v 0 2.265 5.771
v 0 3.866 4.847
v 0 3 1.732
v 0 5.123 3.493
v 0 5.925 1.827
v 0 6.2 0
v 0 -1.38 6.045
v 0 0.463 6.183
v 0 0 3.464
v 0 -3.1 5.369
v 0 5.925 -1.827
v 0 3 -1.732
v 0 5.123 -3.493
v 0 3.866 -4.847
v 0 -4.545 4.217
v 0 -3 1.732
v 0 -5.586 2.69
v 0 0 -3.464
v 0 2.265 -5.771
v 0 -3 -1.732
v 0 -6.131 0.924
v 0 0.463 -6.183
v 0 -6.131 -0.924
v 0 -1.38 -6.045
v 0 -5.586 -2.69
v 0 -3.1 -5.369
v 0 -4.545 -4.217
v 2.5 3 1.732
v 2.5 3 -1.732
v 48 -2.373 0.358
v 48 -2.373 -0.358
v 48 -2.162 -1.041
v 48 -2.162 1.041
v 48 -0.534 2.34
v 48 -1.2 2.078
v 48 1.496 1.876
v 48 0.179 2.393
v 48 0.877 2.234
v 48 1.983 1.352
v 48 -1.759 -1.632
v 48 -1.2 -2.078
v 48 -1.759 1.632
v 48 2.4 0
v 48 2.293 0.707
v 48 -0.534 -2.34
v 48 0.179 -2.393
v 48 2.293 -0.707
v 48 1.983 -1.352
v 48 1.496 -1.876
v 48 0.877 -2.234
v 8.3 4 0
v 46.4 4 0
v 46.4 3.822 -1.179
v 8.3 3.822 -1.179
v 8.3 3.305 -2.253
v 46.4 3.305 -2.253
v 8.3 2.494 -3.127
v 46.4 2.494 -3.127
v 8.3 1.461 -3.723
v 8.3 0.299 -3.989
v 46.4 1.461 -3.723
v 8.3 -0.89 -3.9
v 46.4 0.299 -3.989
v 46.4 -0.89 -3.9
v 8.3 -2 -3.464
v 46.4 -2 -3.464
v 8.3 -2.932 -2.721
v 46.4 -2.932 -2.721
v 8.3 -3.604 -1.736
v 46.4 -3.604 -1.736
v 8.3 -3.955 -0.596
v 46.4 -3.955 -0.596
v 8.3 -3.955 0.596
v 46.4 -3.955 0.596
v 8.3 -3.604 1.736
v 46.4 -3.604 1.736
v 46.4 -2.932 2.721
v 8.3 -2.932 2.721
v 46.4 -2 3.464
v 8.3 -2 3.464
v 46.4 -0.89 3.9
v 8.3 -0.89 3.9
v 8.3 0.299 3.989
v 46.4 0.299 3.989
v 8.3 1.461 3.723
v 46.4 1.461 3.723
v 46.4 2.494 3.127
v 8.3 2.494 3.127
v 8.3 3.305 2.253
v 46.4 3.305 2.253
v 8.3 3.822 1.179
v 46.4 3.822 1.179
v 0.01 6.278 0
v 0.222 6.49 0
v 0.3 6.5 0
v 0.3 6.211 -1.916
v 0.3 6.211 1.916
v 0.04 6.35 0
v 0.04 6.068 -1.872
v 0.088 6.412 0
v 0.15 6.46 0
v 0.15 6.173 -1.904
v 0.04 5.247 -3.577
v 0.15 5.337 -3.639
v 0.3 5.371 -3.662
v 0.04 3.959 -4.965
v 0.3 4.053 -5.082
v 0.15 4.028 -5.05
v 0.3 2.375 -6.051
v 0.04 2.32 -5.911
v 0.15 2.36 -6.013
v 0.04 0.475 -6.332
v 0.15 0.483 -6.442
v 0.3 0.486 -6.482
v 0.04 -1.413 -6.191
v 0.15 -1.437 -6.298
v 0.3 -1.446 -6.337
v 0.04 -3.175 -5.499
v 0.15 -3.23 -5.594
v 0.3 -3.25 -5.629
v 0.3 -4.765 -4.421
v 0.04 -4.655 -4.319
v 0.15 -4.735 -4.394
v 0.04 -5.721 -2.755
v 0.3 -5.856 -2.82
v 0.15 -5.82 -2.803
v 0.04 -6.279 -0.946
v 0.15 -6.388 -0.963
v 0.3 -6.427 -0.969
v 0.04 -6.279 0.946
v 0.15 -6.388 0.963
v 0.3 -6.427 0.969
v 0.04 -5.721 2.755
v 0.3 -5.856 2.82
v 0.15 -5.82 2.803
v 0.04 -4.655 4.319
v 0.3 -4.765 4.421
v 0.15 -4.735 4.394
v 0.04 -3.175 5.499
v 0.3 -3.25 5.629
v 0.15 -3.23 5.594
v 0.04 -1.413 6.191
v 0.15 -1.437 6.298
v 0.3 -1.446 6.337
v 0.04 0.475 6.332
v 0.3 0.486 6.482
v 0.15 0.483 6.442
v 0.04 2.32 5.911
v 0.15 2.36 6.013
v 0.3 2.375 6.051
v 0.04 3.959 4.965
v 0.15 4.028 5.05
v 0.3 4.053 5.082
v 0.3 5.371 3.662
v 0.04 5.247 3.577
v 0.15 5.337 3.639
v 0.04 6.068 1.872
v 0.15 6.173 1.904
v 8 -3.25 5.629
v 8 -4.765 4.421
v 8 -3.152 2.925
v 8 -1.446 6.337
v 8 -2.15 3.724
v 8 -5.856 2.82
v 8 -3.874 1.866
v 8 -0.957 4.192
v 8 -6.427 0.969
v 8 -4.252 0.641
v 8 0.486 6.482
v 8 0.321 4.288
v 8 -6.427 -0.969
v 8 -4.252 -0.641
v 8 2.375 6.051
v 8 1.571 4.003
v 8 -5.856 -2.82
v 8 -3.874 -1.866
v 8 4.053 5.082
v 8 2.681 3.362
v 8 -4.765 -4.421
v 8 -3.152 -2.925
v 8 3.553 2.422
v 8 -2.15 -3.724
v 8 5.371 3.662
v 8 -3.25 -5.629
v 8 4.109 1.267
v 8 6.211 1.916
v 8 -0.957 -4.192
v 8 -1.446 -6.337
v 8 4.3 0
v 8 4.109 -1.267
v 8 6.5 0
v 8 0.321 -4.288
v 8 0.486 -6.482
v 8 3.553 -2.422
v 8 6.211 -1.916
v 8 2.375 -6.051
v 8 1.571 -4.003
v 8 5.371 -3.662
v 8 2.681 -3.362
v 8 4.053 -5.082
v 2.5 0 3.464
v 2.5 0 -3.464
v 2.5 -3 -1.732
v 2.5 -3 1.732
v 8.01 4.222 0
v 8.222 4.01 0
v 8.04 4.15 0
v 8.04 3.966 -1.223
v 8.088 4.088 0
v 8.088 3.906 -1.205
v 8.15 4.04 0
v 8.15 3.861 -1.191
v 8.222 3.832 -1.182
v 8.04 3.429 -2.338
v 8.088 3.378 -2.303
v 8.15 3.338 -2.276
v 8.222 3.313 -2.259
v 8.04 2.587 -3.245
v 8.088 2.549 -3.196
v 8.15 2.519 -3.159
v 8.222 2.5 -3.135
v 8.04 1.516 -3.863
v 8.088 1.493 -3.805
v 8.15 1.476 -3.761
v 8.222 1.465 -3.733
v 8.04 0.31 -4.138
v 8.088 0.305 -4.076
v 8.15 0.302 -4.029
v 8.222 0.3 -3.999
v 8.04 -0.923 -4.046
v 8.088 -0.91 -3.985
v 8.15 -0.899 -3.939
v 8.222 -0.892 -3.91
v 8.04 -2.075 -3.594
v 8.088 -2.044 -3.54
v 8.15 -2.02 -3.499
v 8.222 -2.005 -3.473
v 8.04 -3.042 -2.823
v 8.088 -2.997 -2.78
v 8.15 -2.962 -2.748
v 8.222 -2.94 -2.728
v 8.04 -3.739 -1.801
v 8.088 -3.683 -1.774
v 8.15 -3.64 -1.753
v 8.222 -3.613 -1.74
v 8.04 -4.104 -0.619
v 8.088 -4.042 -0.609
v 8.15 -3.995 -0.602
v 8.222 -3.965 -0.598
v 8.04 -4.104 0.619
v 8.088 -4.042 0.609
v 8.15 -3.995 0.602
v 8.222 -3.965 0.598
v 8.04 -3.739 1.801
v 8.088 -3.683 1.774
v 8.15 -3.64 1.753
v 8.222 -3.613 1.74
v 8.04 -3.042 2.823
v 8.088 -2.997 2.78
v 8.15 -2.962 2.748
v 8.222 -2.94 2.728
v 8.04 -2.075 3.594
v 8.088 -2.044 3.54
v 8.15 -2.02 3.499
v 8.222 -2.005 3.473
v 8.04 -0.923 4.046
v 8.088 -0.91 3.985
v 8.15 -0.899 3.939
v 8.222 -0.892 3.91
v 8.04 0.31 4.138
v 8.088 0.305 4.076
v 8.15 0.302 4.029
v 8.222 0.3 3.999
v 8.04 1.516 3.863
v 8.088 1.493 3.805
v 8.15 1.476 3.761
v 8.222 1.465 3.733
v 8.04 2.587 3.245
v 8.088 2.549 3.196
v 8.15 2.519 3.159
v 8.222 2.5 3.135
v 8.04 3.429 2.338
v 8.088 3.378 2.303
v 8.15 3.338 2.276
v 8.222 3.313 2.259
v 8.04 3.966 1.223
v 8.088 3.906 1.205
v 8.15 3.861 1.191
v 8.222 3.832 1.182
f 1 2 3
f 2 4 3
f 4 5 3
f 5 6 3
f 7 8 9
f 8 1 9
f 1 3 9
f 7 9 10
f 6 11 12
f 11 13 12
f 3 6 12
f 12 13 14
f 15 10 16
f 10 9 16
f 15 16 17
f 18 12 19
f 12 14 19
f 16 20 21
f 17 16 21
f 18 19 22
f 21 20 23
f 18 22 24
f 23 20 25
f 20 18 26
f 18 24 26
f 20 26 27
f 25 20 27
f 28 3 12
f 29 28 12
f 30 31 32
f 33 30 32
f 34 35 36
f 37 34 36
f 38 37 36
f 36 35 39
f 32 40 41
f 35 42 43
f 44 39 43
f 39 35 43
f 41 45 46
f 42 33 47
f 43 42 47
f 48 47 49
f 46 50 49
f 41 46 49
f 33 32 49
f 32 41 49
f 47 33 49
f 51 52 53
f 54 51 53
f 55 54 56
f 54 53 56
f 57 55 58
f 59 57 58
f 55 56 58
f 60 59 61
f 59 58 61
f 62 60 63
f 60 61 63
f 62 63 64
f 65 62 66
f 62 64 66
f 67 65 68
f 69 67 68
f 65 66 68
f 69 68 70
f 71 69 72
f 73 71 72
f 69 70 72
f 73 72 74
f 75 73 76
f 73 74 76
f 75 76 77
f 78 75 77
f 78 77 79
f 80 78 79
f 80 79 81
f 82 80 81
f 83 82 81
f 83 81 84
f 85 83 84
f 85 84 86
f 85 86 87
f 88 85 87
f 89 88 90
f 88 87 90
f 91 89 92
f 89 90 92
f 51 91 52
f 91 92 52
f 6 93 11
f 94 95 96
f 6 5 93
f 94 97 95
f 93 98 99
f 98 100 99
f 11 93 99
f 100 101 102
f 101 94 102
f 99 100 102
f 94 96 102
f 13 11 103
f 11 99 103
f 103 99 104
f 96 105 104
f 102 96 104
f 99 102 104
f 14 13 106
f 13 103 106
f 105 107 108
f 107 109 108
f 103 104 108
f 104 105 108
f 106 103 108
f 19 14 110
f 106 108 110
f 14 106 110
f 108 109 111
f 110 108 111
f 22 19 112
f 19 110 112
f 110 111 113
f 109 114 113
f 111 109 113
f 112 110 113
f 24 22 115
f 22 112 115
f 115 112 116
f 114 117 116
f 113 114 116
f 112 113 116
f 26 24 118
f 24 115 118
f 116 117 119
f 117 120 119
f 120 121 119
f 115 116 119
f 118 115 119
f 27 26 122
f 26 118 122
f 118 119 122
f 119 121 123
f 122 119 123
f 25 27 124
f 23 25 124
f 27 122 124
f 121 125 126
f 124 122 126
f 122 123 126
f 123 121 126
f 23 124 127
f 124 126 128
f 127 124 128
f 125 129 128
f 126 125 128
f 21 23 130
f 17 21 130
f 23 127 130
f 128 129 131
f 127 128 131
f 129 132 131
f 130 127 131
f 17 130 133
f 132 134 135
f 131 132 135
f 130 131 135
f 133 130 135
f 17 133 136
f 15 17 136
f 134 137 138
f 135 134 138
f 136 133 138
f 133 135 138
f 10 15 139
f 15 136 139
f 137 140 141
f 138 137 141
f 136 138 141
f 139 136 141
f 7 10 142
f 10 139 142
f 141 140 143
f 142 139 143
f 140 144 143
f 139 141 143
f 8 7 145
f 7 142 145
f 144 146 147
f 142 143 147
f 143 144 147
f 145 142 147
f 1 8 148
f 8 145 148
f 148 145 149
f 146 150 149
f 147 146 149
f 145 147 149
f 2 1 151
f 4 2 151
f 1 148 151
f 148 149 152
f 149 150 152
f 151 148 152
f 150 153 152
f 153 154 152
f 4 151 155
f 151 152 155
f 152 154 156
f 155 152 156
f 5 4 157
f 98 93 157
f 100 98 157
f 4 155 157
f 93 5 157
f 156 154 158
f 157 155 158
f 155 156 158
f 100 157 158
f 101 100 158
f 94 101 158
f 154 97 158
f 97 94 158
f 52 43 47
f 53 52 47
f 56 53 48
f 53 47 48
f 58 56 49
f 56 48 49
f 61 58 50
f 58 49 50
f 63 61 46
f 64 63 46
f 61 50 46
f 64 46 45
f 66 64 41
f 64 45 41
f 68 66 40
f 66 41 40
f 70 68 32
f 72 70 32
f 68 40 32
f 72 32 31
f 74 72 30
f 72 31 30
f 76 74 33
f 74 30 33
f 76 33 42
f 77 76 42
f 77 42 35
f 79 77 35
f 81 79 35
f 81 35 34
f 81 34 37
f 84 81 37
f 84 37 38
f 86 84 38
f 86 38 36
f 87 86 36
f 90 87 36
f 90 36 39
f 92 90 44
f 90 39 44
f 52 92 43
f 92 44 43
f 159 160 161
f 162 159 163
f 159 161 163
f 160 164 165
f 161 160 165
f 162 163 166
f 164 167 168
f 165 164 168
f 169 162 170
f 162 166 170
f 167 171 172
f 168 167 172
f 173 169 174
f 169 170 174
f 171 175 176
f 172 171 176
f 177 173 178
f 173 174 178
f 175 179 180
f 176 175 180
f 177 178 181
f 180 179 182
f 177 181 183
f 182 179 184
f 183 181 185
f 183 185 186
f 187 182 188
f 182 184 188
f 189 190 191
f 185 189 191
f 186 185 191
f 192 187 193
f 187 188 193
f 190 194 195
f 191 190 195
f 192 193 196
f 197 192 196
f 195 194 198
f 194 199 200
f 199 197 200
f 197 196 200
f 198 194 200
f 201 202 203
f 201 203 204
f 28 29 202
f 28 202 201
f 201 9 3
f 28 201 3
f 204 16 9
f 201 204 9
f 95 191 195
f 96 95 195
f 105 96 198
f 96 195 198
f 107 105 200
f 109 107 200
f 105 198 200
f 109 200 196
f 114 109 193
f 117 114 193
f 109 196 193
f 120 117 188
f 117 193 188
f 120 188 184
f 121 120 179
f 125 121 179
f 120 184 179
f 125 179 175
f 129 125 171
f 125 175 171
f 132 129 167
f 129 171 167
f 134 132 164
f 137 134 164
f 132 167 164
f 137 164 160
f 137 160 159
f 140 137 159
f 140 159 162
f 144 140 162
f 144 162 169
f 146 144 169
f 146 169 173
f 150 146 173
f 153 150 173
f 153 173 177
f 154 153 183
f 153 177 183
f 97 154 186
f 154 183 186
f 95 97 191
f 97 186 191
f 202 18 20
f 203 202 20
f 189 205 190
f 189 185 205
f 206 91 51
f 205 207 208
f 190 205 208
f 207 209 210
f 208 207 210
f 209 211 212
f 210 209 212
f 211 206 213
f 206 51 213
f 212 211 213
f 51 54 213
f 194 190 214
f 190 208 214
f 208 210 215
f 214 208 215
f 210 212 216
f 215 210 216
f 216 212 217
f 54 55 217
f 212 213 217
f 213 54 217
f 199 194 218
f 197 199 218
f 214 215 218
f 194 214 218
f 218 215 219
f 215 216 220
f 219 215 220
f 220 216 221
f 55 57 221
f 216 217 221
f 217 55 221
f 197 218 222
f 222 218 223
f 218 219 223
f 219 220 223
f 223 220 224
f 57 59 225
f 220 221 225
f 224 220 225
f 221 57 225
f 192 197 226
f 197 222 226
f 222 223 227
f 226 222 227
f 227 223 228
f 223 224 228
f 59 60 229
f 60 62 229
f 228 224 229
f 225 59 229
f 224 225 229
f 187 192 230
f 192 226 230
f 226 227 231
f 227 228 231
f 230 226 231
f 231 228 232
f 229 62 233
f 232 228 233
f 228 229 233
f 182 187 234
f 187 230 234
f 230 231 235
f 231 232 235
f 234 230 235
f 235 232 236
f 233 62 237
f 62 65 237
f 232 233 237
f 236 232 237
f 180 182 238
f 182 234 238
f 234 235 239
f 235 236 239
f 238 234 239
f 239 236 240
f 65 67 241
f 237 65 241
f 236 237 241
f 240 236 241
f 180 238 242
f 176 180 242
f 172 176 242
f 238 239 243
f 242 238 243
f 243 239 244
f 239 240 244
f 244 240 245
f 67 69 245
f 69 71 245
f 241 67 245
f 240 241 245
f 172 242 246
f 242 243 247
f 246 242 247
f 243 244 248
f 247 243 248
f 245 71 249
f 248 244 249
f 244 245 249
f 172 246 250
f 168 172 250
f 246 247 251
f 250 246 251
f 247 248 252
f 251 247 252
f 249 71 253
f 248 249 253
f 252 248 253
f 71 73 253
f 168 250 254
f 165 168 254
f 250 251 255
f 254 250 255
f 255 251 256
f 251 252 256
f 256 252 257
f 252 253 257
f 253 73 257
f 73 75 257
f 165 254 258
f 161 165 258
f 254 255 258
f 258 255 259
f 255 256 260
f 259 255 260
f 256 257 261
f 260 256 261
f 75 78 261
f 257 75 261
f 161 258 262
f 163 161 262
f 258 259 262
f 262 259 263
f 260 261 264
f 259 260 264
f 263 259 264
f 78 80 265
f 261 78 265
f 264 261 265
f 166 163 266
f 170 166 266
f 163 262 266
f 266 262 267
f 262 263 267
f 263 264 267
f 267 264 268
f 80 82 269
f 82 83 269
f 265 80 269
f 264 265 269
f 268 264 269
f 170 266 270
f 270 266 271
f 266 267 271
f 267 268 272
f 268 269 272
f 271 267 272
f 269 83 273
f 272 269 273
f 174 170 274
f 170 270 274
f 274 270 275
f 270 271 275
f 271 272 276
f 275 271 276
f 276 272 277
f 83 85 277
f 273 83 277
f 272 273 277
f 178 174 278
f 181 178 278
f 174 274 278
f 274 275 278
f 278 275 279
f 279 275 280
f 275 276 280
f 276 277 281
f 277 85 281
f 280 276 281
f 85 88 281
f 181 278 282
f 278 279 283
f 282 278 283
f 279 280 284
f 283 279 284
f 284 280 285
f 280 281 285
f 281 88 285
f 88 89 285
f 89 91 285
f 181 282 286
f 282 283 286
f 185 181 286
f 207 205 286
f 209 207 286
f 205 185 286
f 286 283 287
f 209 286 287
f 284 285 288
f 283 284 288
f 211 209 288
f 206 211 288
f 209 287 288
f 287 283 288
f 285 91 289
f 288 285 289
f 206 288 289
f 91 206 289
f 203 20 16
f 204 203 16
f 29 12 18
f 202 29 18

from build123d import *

# Parameters (mm, degrees)
CUT_EXTRUDE_1_DEPTH = 2.5
FILLET_1_R          = 0.3
CHAMFER_1_SIZE      = 1.6


with BuildPart() as part:
    # Эскиз1 → Повернуть1 (revolve)
    with BuildSketch(Plane.XY):
        Polygon((0, 0), (0, 6.5), (8, 6.5), (8, 4), (48, 4), (48, 0), align=None)
    revolve(axis=Axis((48, 0, 0), (-1, 0, 0)))

    # Эскиз2 → Вырез-Вытянуть1 (cut)
    with BuildSketch(Plane.ZY):
        Polygon((-1.732050808, 3), (-3.464101615, 0), (-1.732050808, -3), (1.732050808, -3), (3.464101615, 0), (1.732050808, 3), align=None)
    extrude(amount=-CUT_EXTRUDE_1_DEPTH, mode=Mode.SUBTRACT)

    # Скругление1
    fillet_1_edges = [part.edges().sort_by_distance(p)[0] for p in [
        (8, -4, 0),
        (0, -6.5, 0),
    ]]
    fillet(fillet_1_edges, radius=FILLET_1_R)

    # Фаска1
    chamfer_1_edges = [part.edges().sort_by_distance(p)[0] for p in [
        (48, -4, 0),
    ]]
    chamfer(chamfer_1_edges, length=CHAMFER_1_SIZE)


solid = part.part
